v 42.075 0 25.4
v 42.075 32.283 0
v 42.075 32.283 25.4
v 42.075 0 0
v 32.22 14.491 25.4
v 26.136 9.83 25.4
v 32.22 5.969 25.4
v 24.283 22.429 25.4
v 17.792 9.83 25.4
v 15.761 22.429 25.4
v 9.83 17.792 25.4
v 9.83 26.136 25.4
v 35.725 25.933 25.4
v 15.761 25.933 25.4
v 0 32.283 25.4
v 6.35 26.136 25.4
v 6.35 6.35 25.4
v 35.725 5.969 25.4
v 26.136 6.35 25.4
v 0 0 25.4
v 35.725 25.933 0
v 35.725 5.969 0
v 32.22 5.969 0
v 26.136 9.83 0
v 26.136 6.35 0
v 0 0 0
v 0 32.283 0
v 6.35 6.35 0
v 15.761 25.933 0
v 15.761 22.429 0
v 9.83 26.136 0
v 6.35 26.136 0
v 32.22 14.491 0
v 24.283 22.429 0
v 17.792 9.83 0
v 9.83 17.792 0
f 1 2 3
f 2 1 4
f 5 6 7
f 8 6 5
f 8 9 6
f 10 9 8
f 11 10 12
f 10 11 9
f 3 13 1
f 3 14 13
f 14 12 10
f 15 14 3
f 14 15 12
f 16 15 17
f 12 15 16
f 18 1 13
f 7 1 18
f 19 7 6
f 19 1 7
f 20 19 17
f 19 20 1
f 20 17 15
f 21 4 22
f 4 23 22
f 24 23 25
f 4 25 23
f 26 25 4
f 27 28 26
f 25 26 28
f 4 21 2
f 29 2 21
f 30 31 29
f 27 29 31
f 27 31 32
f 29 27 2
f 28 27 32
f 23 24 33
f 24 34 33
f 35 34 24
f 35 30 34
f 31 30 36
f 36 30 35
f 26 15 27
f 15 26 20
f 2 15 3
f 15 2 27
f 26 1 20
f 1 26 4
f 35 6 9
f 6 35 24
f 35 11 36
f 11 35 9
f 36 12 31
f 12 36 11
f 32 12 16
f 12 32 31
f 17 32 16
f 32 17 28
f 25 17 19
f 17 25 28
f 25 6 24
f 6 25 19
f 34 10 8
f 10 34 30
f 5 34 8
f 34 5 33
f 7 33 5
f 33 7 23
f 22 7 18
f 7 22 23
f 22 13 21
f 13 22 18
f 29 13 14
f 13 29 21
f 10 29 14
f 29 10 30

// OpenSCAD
// file: Angle Stock.scad
AngleStockWidth                   = 1;
AngleStockThickness               = 2;
AngleStockTrough                  = 3; // Thickness across the "elbow" of the angle
AngleStockWidthClearanceSnug      = 4;
AngleStockWidthClearanceLoose     = 5;
AngleStockThicknessClearanceSnug  = 6;
AngleStockThicknessClearanceLoose = 7;
AngleStockHeight                  = 8;

// .747
// .744
// .745
//.740


//.749
//.75
AngleStockThreeQuartersByOneEighthInch = [
  [AngleStockWidth,                   0.771],
  [AngleStockThickness,               0.13],
  [AngleStockTrough,                  0.235],
  [AngleStockWidthClearanceSnug,      0.008],
  [AngleStockWidthClearanceLoose,     0.015],
  [AngleStockThicknessClearanceSnug,  0.007],
  [AngleStockThicknessClearanceLoose, 0.008],
  [AngleStockHeight,                  0.574]
];

3_4_angle_stock_width                     = 3/4;
3_4_angle_stock_thickness                 = 0.13;
3_4_angle_stock_trough                    = 0.235;
3_4_angle_stock_height                    = 0.574;
3_4_angle_stock_width_clearance           = 0.008;
3_4_angle_stock_width_clearance_loose     = 0.008;
3_4_angle_stock_thickness_clearance       = 0.005;
3_4_angle_stock_thickness_clearance_loose = 0.007;

// trough is a percentage: 0.0-1.0
module AngleStock(stock=AngleStockThreeQuartersByOneEighthInch, trough=.5, thicknessClearance=AngleStockThicknessClearanceLoose, widthClearance=AngleStockWidthClearanceLoose, length=1) {

  // A percentage of the inner-side length (width - thickness)
  clearThicknessOffset = thicknessClearance != undef ? lookup(thicknessClearance, stock) : 0;
  clearWidthOffset     = widthClearance     != undef ? lookup(widthClearance, stock)     : 0;
  troughOffset         = (trough * (lookup(AngleStockWidth, stock) - lookup(AngleStockThickness, stock))) + lookup(AngleStockThickness, stock);

  linear_extrude(height=length)
  polygon(points=[[0,0],
                  [lookup(AngleStockWidth, stock)+clearWidthOffset,0],                                                         // X-POS Outer Corner
                  [lookup(AngleStockWidth, stock)+clearWidthOffset,lookup(AngleStockThickness, stock)+clearThicknessOffset],   // X-POS Inner Corner
                  [troughOffset,lookup(AngleStockThickness, stock)+clearThicknessOffset],                                      // X-POS Trough
                  [lookup(AngleStockThickness, stock)+clearThicknessOffset,troughOffset],                                      // Y-POS Trough
                  [lookup(AngleStockThickness, stock)+clearThicknessOffset,lookup(AngleStockWidth, stock)+clearWidthOffset],   // Y-POS Inner Corner
                  [0,lookup(AngleStockWidth, stock)+clearWidthOffset],                                                         // Y-POS Outer Corner
          ],
          paths=[[0,1,2,3,4,5,6]]);
}


//#AngleStock();

module 3_4_angle_stock(length=1, cutter=false, loose=false) {
  width_clearance     = loose ? 3_4_angle_stock_width_clearance_loose     : 3_4_angle_stock_width_clearance;
  thickness_clearance = loose ? 3_4_angle_stock_thickness_clearance_loose : 3_4_angle_stock_thickness_clearance;

  union() {
    if (cutter) {
      translate([-width_clearance,-thickness_clearance,0])
      cube([3_4_angle_stock_width     + width_clearance*2,
            3_4_angle_stock_thickness + thickness_clearance*2,
            length]);

      translate([-width_clearance,-thickness_clearance,0])
      cube([3_4_angle_stock_thickness + thickness_clearance*2,
            3_4_angle_stock_width     + width_clearance*2,
            length]);

      translate([3_4_angle_stock_thickness/2, 3_4_angle_stock_thickness/2, 0])
      difference() {
        cube([3_4_angle_stock_trough + thickness_clearance/2,
              3_4_angle_stock_trough + thickness_clearance/2,
              length]);

        translate([3_4_angle_stock_trough + thickness_clearance/2,
                   thickness_clearance/2,
                   -0.1])
        rotate([0,0,45])
        cube([3_4_angle_stock_trough*sqrt(2),
              3_4_angle_stock_trough*sqrt(2),
              length + 0.2]);
      }

    } else {
      cube([3_4_angle_stock_width,3_4_angle_stock_thickness,length]);
      cube([3_4_angle_stock_thickness,3_4_angle_stock_width,length]);

      translate([3_4_angle_stock_thickness, 3_4_angle_stock_thickness, 0])
      difference() {
        cube([3_4_angle_stock_trough, 3_4_angle_stock_trough,length]);

        translate([3_4_angle_stock_trough,0,-0.1])
        rotate([0,0,45])
        cube([3_4_angle_stock_trough*sqrt(2), 3_4_angle_stock_trough*sqrt(2),length + 0.2]);
      }
    }
  };
}
// main file
include <Angle Stock.scad>;

// Print with 100% infill
module AngleStockCalibration(stock = AngleStockThreeQuartersByOneEighthInch,
                             wall  = 1/4,
                             height=1) {

  width = lookup(AngleStockWidth, stock);

  difference() {
    cube([width*1.5 + wall*2,width + wall*2,height]);

    // Tight
    translate([wall, wall, -0.1])
    AngleStock(stock=AngleStockThreeQuartersByOneEighthInch,
               thicknessClearance=AngleStockThicknessClearanceSnug,
               widthClearance=AngleStockWidthClearanceSnug,
               length=height*2);

    // Loose
    translate([width*1.5 + wall, width + wall, -0.1])
    rotate([0,0,180])
    AngleStock(stock=AngleStockThreeQuartersByOneEighthInch,
               thicknessClearance=AngleStockThicknessClearanceLoose,
               widthClearance=AngleStockWidthClearanceLoose,
               length=height*2);
  }
}

scale([25.4, 25.4, 25.4]) {
  AngleStockCalibration();
}
